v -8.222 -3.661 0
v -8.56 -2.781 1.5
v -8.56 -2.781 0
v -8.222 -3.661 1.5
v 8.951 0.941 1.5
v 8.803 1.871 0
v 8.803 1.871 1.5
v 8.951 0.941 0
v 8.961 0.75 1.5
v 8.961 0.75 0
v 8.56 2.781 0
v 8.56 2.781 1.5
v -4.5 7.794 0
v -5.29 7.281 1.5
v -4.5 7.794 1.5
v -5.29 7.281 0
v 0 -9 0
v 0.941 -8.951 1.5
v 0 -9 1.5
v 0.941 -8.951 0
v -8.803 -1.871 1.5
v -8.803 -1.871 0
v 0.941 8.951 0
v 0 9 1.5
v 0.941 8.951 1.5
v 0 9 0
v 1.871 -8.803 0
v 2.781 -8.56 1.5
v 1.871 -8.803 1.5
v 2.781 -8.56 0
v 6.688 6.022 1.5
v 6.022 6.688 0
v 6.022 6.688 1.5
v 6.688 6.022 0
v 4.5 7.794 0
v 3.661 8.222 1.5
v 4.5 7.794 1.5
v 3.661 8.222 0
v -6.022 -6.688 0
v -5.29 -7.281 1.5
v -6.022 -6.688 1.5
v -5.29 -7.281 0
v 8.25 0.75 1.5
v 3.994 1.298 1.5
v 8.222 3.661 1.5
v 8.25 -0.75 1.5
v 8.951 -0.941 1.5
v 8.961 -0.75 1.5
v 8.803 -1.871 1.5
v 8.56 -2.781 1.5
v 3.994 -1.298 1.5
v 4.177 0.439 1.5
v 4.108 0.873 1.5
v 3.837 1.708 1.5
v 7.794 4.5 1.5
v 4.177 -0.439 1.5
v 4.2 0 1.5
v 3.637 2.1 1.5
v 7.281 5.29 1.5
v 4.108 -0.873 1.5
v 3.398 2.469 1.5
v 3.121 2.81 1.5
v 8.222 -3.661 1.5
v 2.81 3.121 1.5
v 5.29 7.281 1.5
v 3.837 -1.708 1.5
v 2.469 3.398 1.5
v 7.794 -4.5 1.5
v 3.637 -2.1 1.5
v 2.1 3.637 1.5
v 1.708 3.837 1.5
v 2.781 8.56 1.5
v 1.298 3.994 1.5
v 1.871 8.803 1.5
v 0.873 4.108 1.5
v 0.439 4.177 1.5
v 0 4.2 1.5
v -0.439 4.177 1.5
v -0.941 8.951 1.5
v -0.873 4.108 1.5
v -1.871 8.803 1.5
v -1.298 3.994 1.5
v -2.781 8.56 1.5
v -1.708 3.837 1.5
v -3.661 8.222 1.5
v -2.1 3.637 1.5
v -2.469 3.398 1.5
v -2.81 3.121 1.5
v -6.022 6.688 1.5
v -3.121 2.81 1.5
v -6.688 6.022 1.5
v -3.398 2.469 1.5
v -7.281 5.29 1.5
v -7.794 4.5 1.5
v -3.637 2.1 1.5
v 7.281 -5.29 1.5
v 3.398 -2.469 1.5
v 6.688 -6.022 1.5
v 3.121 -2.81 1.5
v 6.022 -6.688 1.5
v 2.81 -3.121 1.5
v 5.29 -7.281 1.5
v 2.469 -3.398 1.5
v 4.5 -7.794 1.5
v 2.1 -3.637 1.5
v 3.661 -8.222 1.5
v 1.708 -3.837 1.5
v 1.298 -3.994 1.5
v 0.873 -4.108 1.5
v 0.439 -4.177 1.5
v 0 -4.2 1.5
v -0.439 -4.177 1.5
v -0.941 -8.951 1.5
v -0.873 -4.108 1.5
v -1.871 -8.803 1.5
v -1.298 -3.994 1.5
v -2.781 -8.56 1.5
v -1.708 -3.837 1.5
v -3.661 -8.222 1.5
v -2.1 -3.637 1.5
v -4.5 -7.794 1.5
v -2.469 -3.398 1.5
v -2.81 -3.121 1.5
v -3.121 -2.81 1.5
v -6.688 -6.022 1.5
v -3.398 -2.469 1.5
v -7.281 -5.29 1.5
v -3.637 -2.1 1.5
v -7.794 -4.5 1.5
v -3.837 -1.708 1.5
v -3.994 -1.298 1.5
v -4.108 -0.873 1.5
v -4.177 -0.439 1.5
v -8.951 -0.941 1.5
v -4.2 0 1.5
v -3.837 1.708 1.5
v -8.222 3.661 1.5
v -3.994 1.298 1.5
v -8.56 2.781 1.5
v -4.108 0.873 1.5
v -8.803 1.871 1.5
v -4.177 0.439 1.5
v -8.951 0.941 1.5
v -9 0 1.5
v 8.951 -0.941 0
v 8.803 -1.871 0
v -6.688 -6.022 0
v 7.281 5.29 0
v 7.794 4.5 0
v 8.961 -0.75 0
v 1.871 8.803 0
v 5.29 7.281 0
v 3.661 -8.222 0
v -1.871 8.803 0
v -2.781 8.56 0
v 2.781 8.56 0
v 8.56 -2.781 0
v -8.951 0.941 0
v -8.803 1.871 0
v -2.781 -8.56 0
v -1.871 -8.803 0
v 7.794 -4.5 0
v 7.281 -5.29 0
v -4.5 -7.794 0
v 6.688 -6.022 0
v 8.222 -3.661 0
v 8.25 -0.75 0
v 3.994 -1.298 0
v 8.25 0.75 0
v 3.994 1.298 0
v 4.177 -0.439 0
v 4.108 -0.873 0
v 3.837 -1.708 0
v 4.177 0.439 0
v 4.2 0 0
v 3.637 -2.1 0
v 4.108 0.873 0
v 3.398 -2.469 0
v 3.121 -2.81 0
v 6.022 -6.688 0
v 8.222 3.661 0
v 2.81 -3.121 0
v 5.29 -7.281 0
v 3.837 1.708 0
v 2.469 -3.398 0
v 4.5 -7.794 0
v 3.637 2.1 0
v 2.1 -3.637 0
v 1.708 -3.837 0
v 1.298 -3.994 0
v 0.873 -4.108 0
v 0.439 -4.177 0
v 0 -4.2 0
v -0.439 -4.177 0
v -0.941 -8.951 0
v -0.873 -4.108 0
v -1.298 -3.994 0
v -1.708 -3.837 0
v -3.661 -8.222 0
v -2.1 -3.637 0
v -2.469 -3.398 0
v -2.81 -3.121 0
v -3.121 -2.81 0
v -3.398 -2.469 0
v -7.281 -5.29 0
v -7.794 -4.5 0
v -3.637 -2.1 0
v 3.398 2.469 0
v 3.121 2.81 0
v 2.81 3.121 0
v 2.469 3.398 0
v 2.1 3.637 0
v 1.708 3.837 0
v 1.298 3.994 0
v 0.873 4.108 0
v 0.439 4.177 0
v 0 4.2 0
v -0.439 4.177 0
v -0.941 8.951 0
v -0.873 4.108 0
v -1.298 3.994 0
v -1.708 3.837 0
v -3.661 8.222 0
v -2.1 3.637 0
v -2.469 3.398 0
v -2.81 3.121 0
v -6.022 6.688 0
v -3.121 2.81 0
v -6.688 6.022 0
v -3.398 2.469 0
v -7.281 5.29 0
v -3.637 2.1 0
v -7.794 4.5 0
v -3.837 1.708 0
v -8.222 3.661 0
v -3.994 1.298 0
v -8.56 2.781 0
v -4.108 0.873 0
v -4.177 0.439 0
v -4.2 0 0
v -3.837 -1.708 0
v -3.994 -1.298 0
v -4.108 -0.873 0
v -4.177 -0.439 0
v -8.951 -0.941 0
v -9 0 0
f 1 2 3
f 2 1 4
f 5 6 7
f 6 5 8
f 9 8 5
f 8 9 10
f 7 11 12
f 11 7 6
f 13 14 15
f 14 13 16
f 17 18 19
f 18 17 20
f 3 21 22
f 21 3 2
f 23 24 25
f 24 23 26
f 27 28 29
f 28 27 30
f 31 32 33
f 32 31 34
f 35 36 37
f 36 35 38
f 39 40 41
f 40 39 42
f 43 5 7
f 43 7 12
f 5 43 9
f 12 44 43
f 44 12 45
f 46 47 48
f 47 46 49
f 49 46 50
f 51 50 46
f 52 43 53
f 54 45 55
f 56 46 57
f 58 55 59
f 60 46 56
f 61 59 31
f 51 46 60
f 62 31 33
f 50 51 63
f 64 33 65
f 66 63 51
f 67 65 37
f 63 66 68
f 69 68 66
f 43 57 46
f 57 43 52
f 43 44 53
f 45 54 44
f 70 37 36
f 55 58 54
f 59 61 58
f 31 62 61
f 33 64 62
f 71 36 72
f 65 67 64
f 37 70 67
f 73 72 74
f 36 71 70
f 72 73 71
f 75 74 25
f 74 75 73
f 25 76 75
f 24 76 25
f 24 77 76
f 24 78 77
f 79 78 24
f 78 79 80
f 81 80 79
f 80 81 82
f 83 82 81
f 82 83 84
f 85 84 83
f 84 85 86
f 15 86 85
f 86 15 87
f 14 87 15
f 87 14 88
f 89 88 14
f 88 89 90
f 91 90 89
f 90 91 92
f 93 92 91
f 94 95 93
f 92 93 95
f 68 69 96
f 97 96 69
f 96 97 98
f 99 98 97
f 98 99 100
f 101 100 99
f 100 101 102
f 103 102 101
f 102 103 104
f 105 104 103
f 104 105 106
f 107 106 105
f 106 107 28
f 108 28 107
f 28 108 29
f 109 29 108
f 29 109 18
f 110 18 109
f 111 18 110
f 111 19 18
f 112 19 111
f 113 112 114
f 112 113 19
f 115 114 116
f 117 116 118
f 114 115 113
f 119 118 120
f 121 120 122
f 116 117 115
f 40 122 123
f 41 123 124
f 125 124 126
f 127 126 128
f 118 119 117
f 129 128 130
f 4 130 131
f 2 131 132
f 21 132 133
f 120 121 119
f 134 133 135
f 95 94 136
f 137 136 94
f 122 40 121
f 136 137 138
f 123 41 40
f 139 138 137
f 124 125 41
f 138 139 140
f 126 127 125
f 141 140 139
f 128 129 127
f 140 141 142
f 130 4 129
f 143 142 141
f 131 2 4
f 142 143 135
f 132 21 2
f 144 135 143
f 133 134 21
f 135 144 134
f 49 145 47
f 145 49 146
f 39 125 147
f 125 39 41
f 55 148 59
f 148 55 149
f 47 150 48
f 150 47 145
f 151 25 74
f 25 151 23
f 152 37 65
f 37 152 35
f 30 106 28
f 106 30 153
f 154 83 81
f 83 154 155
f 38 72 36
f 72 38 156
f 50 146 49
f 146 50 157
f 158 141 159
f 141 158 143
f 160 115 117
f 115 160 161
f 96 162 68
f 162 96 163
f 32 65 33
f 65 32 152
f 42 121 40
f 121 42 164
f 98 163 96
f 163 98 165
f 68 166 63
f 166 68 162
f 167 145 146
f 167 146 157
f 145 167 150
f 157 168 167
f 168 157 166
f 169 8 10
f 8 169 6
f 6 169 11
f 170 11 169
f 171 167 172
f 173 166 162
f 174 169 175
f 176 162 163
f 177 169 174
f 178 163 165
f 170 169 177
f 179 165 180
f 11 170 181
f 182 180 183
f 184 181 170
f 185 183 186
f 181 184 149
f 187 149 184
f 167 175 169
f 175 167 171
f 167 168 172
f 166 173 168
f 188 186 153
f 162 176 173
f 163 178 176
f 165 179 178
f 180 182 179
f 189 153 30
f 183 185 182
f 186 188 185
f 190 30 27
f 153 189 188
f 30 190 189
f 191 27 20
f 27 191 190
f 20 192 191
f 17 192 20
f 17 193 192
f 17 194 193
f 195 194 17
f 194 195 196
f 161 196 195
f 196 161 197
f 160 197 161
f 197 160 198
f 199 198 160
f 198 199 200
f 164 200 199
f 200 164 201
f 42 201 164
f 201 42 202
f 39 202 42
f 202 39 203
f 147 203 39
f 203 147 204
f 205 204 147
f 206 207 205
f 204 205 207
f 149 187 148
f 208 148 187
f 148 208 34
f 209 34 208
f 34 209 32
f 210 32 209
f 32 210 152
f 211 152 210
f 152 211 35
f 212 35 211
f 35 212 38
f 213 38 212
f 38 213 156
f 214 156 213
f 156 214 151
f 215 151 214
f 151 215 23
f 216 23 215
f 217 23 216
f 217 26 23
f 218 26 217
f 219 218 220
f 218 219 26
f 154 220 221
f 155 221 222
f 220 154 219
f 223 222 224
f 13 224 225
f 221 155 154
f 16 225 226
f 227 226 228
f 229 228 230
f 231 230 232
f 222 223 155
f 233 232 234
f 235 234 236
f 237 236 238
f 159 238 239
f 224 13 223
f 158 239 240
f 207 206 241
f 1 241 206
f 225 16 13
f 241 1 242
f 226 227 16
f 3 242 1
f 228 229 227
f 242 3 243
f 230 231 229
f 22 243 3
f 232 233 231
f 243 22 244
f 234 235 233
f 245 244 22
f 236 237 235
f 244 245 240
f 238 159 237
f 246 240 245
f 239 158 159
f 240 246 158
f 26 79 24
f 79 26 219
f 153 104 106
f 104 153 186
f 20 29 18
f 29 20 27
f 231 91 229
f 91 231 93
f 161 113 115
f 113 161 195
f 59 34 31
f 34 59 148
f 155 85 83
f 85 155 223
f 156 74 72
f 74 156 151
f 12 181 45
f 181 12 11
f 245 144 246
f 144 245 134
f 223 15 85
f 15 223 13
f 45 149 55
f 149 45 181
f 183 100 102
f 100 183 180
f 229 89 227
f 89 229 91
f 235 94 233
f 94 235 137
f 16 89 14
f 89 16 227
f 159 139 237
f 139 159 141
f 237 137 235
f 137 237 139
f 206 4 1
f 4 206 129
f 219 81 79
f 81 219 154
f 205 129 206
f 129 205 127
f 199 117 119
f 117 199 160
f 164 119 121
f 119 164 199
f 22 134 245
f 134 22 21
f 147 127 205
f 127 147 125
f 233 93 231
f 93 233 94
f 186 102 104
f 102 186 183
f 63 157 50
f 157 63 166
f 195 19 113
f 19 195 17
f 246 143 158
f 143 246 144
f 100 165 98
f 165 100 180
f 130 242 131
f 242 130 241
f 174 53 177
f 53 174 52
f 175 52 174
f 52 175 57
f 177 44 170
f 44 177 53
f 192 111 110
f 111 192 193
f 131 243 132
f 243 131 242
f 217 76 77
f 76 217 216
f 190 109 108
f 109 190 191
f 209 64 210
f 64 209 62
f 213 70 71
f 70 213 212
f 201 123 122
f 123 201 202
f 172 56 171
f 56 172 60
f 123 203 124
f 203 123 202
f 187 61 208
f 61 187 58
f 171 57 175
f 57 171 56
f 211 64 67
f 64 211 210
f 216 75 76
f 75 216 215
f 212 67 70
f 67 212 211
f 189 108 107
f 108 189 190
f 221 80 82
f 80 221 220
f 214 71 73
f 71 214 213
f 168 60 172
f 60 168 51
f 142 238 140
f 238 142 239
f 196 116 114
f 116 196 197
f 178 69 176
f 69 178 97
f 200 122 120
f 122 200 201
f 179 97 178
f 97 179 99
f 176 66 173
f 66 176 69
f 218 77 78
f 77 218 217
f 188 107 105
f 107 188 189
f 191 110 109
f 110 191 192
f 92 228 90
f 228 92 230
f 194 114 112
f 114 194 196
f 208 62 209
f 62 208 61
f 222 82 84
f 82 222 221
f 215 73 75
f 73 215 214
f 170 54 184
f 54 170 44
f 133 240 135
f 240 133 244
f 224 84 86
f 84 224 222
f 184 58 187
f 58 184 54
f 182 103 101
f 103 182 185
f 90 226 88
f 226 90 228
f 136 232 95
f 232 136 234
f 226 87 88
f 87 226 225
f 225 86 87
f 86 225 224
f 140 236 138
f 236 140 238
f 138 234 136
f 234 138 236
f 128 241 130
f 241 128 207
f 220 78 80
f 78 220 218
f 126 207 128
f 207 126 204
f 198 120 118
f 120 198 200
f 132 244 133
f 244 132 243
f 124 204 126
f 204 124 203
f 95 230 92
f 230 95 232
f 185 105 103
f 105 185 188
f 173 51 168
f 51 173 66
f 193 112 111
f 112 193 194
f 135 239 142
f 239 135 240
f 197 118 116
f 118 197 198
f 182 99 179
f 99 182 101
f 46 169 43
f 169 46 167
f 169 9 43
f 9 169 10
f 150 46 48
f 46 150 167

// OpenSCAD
// Split lock washer.
$fn = 60;
eps = 0.02;
inner_d = 8.4;
outer_d = 18;
thickness = 1.5;
gap = 1.5;
difference() {
    cylinder(d=outer_d,h=thickness);
    translate([0,0,-eps]) cylinder(d=inner_d,h=thickness+2*eps);
    translate([outer_d/2-gap/2,-gap/2,-eps]) cube([gap+eps,gap,thickness+2*eps]);
}
